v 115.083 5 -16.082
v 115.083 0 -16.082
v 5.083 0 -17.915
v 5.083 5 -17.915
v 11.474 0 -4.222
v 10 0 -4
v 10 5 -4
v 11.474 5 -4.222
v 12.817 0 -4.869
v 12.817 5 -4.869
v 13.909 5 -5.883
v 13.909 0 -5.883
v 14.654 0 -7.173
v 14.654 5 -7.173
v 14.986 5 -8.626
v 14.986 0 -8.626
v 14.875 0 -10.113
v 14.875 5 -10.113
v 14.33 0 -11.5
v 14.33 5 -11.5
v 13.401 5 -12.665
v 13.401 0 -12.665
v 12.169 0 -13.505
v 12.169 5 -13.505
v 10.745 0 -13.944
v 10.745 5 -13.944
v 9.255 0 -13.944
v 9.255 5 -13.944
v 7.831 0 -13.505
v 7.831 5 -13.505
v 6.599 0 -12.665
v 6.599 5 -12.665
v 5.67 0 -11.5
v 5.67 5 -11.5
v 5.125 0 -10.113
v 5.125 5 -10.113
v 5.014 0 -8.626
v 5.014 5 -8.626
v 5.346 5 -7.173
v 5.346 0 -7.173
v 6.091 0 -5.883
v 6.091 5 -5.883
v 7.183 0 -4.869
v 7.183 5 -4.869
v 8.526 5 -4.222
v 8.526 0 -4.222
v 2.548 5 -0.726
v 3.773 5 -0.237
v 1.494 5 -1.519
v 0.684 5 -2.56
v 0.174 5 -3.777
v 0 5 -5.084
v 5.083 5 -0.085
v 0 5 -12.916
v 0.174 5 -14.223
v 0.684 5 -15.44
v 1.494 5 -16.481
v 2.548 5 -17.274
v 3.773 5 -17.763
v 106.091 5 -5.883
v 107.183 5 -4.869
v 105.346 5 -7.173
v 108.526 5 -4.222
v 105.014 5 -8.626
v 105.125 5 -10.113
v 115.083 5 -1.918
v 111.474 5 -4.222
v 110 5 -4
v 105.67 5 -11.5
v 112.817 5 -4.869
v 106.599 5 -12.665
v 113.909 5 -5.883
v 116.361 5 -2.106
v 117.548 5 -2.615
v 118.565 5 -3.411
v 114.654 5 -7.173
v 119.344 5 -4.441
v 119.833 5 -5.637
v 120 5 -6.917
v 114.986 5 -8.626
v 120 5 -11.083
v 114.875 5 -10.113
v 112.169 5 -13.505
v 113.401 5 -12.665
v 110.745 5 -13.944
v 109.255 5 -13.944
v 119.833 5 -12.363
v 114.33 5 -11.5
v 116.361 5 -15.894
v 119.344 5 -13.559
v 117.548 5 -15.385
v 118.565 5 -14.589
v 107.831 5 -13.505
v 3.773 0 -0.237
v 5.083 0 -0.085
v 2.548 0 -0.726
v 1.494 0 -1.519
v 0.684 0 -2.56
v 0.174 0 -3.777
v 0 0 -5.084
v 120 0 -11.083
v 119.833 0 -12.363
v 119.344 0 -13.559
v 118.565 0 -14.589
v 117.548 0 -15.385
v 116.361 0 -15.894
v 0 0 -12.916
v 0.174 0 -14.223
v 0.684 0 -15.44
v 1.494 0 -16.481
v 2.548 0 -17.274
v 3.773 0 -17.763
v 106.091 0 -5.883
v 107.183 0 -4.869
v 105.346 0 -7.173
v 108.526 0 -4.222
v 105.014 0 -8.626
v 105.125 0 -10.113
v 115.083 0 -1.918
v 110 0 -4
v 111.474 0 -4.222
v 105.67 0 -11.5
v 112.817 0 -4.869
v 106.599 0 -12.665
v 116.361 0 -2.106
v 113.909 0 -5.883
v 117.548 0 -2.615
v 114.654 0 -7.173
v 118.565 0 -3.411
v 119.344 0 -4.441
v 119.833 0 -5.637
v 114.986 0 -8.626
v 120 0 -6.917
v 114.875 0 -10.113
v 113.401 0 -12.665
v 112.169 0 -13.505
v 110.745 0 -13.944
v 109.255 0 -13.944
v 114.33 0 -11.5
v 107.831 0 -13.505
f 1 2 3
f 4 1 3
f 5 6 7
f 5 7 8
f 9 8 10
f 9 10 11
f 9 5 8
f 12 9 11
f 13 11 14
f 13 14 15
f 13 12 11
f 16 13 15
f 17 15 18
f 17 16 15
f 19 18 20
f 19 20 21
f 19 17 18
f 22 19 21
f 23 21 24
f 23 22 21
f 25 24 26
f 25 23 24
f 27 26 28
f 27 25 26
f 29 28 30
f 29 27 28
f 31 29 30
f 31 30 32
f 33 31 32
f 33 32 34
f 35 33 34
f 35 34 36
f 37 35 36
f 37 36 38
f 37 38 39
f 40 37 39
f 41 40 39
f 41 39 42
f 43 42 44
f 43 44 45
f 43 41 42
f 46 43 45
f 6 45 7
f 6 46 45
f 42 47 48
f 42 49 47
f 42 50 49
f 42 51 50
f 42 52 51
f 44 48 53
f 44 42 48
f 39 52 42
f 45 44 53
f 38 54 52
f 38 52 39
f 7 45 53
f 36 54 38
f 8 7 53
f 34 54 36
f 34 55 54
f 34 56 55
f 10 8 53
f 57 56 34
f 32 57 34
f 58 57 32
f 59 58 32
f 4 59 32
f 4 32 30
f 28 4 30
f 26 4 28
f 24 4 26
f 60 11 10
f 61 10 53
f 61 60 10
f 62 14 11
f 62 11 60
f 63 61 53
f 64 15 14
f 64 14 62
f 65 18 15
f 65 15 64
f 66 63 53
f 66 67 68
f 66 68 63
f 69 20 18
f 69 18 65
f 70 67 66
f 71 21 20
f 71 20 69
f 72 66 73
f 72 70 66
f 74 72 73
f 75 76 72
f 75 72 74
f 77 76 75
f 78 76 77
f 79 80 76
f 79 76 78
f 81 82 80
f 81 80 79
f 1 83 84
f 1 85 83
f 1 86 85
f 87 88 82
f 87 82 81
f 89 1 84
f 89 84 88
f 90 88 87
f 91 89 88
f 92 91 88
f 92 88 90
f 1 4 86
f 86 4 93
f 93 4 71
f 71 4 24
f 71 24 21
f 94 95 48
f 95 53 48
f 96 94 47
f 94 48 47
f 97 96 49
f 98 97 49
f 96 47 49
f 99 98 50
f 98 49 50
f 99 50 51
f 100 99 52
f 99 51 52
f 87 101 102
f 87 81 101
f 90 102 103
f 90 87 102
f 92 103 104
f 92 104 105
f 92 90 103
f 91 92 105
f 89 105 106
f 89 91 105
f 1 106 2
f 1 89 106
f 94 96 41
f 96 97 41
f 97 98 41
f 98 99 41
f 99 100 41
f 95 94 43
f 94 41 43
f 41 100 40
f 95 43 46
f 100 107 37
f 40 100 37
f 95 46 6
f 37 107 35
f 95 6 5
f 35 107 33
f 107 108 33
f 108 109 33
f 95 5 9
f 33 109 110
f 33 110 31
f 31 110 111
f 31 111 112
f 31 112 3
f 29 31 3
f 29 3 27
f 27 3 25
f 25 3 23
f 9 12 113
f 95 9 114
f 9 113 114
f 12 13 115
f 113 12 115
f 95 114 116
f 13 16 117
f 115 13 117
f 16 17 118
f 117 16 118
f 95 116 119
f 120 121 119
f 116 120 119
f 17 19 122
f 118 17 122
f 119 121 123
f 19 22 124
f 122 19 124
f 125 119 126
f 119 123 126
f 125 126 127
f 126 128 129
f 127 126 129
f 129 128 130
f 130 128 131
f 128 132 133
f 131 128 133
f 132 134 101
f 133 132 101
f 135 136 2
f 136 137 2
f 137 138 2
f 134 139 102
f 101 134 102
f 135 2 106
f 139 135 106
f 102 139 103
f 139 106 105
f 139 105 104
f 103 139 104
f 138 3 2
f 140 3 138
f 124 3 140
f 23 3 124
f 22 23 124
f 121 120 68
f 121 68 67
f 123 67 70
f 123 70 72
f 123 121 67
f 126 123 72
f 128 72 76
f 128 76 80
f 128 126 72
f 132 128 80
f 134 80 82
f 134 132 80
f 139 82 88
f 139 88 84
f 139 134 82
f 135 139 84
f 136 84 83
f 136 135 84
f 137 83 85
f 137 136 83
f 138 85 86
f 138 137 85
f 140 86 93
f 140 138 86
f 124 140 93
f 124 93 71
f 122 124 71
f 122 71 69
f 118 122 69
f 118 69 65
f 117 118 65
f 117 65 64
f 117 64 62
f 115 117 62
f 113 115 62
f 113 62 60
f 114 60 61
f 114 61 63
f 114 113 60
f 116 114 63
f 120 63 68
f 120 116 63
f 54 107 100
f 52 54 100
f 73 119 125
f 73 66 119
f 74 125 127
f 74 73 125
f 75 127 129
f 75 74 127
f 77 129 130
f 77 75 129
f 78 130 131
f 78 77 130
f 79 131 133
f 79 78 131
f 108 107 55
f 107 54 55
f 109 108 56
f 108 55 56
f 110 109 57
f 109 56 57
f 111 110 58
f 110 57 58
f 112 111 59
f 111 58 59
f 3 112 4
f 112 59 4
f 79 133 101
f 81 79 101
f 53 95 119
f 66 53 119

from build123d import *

# Parameters (mm, degrees)
CROQUIS1_R              = 5
SALIENTE_EXTRUIR1_DEPTH = 5
REDONDEO1_R             = 5


with BuildPart() as part:
    # Croquis1 → Saliente-Extruir1 (new body)
    with BuildSketch(Plane(origin=(0, 0, 0), x_dir=(1, 0, 0), z_dir=(0, 1, 0))):
        Polygon((0, 0), (119.999982993, 2), (119.999982993, 16), (0, 18), align=None)
        with Locations(Location((10, 9, 0), (0, 0, 270))):
            Circle(CROQUIS1_R, mode=Mode.SUBTRACT)
        with Locations(Location((110, 9, 0), (0, 0, 270))):
            Circle(CROQUIS1_R, mode=Mode.SUBTRACT)
    extrude(amount=SALIENTE_EXTRUIR1_DEPTH)

    # Redondeo1
    redondeo1_edges = [part.edges().sort_by_distance(p)[0] for p in [
        (0, 2.5, -18),
        (119.999982993, 2.5, -16),
        (119.999982993, 2.5, -2),
        (0, 2.5, 0),
    ]]
    fillet(redondeo1_edges, radius=REDONDEO1_R)


solid = part.part
